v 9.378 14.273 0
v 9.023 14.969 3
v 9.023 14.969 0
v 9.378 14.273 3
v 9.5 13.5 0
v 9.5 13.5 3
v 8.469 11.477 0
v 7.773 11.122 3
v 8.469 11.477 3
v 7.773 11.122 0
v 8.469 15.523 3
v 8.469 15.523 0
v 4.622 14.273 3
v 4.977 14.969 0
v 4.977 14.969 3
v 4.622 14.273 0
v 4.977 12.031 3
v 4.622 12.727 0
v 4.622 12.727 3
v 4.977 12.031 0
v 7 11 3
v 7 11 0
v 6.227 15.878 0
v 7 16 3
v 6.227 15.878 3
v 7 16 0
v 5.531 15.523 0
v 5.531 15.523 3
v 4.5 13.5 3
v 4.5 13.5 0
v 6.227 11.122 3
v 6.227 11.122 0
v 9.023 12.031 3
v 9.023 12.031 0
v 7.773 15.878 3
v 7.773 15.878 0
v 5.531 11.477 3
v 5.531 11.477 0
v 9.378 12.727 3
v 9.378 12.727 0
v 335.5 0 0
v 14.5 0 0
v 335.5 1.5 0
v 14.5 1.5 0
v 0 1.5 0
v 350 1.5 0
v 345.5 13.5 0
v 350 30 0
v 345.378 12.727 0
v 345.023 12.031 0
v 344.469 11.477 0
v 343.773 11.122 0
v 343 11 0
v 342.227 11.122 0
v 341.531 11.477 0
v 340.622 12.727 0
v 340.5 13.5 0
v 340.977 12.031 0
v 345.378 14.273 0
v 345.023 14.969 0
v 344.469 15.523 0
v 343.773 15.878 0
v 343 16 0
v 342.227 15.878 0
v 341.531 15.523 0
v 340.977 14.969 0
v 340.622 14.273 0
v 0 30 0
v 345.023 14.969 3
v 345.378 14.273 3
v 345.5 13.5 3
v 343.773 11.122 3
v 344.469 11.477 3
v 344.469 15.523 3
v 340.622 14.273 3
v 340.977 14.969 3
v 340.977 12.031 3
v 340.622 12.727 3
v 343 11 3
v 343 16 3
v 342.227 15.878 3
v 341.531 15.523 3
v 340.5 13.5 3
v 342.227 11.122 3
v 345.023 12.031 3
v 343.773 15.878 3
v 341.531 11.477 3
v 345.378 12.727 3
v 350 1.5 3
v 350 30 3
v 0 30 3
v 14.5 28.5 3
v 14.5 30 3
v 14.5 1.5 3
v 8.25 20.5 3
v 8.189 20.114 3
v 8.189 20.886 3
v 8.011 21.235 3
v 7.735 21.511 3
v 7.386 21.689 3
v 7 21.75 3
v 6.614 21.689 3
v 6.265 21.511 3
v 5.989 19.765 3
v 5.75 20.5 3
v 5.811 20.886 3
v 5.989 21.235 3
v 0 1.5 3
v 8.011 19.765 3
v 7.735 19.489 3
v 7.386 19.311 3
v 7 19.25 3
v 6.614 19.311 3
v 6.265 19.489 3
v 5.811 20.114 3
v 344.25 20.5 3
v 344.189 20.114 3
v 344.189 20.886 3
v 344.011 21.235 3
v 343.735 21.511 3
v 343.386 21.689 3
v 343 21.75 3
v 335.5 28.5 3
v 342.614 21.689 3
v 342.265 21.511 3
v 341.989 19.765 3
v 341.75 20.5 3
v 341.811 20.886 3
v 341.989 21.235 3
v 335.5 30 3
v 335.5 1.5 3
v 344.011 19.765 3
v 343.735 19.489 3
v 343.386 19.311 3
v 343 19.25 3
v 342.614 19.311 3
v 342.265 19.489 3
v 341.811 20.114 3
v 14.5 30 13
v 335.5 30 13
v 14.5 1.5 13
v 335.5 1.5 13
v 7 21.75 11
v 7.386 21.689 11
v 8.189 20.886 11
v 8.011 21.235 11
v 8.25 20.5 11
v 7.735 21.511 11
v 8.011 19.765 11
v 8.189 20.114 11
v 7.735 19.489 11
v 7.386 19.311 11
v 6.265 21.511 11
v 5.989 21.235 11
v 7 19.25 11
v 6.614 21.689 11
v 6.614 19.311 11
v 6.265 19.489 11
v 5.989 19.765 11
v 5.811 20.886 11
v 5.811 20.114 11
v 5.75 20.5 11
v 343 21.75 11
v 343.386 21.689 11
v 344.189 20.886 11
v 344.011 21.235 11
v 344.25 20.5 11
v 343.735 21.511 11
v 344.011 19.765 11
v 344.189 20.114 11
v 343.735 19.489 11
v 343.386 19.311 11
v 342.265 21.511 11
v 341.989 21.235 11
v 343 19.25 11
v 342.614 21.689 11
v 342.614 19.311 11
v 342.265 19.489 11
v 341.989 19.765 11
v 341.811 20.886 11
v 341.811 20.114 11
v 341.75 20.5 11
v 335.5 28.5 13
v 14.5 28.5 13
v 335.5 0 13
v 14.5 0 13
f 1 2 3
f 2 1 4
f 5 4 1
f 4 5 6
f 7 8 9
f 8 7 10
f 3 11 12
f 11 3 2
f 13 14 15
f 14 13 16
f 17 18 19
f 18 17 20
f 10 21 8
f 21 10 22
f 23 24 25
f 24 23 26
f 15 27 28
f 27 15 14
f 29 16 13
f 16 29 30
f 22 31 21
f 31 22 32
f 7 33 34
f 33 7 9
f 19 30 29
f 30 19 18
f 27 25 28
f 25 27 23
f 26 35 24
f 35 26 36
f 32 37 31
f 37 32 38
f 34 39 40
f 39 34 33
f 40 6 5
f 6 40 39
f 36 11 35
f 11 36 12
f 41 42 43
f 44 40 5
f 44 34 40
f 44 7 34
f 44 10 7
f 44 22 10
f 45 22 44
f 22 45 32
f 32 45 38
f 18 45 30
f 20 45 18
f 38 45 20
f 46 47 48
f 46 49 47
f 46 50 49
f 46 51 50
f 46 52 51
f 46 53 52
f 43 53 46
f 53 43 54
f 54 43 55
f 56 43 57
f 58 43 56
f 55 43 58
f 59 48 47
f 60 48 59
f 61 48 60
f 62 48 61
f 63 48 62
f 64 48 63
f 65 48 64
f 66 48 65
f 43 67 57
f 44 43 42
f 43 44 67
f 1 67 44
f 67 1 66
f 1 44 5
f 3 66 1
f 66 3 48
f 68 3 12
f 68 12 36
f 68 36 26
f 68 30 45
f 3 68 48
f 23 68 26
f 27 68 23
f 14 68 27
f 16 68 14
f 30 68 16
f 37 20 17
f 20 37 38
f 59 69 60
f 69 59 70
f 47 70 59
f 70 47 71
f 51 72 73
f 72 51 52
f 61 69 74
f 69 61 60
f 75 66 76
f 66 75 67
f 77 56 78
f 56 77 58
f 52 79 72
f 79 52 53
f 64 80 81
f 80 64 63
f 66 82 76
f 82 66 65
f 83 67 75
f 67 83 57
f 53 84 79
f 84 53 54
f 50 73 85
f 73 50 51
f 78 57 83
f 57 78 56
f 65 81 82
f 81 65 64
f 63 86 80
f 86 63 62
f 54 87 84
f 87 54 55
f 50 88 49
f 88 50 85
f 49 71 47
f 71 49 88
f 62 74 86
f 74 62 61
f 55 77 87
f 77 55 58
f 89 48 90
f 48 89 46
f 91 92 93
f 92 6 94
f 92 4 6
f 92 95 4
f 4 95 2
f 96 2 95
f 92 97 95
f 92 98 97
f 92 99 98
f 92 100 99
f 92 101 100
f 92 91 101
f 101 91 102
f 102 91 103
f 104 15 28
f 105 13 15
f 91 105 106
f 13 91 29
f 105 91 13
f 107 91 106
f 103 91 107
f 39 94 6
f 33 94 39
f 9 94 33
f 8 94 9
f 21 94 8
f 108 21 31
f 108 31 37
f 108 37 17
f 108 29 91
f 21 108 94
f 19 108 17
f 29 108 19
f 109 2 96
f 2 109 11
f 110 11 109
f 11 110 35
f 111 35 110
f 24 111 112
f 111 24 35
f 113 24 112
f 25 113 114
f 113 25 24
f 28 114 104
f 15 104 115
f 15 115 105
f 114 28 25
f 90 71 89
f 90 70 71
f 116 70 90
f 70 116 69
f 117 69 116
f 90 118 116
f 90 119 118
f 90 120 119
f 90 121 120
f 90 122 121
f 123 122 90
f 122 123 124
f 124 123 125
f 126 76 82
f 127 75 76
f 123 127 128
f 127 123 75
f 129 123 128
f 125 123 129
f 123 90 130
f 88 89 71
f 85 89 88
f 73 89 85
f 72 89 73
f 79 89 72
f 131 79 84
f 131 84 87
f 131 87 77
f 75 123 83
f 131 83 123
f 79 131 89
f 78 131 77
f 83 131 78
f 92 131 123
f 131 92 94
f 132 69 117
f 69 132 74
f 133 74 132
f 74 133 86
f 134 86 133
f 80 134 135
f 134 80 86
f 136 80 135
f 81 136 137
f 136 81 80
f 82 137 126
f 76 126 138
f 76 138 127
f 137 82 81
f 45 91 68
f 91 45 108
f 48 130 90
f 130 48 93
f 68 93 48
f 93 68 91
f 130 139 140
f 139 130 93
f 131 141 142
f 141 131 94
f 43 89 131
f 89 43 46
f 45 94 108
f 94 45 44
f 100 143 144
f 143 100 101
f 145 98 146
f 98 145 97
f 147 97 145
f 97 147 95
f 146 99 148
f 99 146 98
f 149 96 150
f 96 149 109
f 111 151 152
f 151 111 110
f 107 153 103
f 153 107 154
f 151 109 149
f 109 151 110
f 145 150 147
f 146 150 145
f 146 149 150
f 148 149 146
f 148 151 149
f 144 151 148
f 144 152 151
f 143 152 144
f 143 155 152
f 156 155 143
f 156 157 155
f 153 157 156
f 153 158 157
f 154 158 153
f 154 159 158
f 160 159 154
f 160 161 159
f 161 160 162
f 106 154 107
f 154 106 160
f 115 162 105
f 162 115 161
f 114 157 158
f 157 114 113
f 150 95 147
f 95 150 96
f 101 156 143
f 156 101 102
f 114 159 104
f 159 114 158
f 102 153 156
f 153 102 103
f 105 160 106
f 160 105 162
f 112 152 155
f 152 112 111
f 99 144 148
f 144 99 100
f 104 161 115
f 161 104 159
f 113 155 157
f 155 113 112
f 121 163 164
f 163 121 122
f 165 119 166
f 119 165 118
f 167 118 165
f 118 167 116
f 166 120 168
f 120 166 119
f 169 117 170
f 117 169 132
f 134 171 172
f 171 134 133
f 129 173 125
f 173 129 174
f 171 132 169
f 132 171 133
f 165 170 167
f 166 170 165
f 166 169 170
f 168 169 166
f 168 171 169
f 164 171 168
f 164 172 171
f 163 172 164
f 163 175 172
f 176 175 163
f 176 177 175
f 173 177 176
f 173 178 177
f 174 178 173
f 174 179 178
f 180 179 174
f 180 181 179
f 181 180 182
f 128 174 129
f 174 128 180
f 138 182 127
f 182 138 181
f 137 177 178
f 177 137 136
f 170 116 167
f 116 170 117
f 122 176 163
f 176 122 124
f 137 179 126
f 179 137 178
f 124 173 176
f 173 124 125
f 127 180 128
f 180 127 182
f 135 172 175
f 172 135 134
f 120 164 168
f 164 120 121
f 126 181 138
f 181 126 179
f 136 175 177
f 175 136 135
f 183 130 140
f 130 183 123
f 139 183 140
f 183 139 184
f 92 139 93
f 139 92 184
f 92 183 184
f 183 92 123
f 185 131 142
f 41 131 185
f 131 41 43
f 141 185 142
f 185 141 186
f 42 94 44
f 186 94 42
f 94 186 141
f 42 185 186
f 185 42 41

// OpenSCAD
// VARIABLES
$fn=20;

width = 350;
totalHeight = 30;
frontThickness = 3;
bottomLipThickness = 1.5;
bottomLipDepth = 10;
topLipThickness = 1.5;
topLipDepth = 10;
sideProtrusion = 14.5;
holeCenterDistanceBottom = 12;
holeCenterDistanceSide = 7;
holeDiameter = 5;
pinCenterDistanceBottom = 19;
pinCenterDistanceSide = 7;
pinDiameter = 2.5;
pinDepth = 8;
gripLength = 30;
gripHeight = 20;

// VARIABLES (CALCULATED)

mainHeight = totalHeight - topLipThickness; // bottom lip is added below, top lip is added behind
bottomLipWidth = width - sideProtrusion*2;
topLipWidth = bottomLipWidth;

// case (general)

module dust_cover() {
  
  translate([0, bottomLipThickness, 0]){
    difference() {
      front_cover();
      
      hole_puncher();
    }

    // #grips();

    translate([0, mainHeight - topLipThickness, frontThickness])
      translate([sideProtrusion, 0, 0])
        top_lip();

    translate([0, 0, frontThickness])
      pins();
  }

  translate([sideProtrusion, 0, 0])
    bottom_lip();
  
}

module front_cover() {

  cube([width, mainHeight, frontThickness]);

}

module hole_puncher() {
  
  translate([holeCenterDistanceSide, holeCenterDistanceBottom, 0])
    #cylinder(d=holeDiameter, h=frontThickness*2, center=false);

  translate([width - holeCenterDistanceSide, holeCenterDistanceBottom, 0])
    #cylinder(d=holeDiameter, h=frontThickness*2, center=false);
  
}

module bottom_lip() {
  
  cube([bottomLipWidth, bottomLipThickness, bottomLipDepth + frontThickness]);

}

module top_lip() {
  
  cube([topLipWidth, topLipThickness, topLipDepth]);

}

module pins() {
  
  translate([pinCenterDistanceSide, pinCenterDistanceBottom, 0])
    cylinder(d=pinDiameter, h=pinDepth, center=false);
  
  translate([width - pinCenterDistanceSide, pinCenterDistanceBottom, 0])
    cylinder(d=pinDiameter, h=pinDepth, center=false);
  
}

module grips() {
  
  translate([0, 0, frontThickness]) {
    rotate([0, 45, 0])
      cube([gripLength, gripHeight, gripThickness]);
    rotate([0, -45, 0])
      cube([gripLength, gripHeight, gripThickness]);
  }
  
}


print = false;

if (print) {

  rotate([0, 0, 45])
    dust_cover();

} else {

  dust_cover();
  
}
  
